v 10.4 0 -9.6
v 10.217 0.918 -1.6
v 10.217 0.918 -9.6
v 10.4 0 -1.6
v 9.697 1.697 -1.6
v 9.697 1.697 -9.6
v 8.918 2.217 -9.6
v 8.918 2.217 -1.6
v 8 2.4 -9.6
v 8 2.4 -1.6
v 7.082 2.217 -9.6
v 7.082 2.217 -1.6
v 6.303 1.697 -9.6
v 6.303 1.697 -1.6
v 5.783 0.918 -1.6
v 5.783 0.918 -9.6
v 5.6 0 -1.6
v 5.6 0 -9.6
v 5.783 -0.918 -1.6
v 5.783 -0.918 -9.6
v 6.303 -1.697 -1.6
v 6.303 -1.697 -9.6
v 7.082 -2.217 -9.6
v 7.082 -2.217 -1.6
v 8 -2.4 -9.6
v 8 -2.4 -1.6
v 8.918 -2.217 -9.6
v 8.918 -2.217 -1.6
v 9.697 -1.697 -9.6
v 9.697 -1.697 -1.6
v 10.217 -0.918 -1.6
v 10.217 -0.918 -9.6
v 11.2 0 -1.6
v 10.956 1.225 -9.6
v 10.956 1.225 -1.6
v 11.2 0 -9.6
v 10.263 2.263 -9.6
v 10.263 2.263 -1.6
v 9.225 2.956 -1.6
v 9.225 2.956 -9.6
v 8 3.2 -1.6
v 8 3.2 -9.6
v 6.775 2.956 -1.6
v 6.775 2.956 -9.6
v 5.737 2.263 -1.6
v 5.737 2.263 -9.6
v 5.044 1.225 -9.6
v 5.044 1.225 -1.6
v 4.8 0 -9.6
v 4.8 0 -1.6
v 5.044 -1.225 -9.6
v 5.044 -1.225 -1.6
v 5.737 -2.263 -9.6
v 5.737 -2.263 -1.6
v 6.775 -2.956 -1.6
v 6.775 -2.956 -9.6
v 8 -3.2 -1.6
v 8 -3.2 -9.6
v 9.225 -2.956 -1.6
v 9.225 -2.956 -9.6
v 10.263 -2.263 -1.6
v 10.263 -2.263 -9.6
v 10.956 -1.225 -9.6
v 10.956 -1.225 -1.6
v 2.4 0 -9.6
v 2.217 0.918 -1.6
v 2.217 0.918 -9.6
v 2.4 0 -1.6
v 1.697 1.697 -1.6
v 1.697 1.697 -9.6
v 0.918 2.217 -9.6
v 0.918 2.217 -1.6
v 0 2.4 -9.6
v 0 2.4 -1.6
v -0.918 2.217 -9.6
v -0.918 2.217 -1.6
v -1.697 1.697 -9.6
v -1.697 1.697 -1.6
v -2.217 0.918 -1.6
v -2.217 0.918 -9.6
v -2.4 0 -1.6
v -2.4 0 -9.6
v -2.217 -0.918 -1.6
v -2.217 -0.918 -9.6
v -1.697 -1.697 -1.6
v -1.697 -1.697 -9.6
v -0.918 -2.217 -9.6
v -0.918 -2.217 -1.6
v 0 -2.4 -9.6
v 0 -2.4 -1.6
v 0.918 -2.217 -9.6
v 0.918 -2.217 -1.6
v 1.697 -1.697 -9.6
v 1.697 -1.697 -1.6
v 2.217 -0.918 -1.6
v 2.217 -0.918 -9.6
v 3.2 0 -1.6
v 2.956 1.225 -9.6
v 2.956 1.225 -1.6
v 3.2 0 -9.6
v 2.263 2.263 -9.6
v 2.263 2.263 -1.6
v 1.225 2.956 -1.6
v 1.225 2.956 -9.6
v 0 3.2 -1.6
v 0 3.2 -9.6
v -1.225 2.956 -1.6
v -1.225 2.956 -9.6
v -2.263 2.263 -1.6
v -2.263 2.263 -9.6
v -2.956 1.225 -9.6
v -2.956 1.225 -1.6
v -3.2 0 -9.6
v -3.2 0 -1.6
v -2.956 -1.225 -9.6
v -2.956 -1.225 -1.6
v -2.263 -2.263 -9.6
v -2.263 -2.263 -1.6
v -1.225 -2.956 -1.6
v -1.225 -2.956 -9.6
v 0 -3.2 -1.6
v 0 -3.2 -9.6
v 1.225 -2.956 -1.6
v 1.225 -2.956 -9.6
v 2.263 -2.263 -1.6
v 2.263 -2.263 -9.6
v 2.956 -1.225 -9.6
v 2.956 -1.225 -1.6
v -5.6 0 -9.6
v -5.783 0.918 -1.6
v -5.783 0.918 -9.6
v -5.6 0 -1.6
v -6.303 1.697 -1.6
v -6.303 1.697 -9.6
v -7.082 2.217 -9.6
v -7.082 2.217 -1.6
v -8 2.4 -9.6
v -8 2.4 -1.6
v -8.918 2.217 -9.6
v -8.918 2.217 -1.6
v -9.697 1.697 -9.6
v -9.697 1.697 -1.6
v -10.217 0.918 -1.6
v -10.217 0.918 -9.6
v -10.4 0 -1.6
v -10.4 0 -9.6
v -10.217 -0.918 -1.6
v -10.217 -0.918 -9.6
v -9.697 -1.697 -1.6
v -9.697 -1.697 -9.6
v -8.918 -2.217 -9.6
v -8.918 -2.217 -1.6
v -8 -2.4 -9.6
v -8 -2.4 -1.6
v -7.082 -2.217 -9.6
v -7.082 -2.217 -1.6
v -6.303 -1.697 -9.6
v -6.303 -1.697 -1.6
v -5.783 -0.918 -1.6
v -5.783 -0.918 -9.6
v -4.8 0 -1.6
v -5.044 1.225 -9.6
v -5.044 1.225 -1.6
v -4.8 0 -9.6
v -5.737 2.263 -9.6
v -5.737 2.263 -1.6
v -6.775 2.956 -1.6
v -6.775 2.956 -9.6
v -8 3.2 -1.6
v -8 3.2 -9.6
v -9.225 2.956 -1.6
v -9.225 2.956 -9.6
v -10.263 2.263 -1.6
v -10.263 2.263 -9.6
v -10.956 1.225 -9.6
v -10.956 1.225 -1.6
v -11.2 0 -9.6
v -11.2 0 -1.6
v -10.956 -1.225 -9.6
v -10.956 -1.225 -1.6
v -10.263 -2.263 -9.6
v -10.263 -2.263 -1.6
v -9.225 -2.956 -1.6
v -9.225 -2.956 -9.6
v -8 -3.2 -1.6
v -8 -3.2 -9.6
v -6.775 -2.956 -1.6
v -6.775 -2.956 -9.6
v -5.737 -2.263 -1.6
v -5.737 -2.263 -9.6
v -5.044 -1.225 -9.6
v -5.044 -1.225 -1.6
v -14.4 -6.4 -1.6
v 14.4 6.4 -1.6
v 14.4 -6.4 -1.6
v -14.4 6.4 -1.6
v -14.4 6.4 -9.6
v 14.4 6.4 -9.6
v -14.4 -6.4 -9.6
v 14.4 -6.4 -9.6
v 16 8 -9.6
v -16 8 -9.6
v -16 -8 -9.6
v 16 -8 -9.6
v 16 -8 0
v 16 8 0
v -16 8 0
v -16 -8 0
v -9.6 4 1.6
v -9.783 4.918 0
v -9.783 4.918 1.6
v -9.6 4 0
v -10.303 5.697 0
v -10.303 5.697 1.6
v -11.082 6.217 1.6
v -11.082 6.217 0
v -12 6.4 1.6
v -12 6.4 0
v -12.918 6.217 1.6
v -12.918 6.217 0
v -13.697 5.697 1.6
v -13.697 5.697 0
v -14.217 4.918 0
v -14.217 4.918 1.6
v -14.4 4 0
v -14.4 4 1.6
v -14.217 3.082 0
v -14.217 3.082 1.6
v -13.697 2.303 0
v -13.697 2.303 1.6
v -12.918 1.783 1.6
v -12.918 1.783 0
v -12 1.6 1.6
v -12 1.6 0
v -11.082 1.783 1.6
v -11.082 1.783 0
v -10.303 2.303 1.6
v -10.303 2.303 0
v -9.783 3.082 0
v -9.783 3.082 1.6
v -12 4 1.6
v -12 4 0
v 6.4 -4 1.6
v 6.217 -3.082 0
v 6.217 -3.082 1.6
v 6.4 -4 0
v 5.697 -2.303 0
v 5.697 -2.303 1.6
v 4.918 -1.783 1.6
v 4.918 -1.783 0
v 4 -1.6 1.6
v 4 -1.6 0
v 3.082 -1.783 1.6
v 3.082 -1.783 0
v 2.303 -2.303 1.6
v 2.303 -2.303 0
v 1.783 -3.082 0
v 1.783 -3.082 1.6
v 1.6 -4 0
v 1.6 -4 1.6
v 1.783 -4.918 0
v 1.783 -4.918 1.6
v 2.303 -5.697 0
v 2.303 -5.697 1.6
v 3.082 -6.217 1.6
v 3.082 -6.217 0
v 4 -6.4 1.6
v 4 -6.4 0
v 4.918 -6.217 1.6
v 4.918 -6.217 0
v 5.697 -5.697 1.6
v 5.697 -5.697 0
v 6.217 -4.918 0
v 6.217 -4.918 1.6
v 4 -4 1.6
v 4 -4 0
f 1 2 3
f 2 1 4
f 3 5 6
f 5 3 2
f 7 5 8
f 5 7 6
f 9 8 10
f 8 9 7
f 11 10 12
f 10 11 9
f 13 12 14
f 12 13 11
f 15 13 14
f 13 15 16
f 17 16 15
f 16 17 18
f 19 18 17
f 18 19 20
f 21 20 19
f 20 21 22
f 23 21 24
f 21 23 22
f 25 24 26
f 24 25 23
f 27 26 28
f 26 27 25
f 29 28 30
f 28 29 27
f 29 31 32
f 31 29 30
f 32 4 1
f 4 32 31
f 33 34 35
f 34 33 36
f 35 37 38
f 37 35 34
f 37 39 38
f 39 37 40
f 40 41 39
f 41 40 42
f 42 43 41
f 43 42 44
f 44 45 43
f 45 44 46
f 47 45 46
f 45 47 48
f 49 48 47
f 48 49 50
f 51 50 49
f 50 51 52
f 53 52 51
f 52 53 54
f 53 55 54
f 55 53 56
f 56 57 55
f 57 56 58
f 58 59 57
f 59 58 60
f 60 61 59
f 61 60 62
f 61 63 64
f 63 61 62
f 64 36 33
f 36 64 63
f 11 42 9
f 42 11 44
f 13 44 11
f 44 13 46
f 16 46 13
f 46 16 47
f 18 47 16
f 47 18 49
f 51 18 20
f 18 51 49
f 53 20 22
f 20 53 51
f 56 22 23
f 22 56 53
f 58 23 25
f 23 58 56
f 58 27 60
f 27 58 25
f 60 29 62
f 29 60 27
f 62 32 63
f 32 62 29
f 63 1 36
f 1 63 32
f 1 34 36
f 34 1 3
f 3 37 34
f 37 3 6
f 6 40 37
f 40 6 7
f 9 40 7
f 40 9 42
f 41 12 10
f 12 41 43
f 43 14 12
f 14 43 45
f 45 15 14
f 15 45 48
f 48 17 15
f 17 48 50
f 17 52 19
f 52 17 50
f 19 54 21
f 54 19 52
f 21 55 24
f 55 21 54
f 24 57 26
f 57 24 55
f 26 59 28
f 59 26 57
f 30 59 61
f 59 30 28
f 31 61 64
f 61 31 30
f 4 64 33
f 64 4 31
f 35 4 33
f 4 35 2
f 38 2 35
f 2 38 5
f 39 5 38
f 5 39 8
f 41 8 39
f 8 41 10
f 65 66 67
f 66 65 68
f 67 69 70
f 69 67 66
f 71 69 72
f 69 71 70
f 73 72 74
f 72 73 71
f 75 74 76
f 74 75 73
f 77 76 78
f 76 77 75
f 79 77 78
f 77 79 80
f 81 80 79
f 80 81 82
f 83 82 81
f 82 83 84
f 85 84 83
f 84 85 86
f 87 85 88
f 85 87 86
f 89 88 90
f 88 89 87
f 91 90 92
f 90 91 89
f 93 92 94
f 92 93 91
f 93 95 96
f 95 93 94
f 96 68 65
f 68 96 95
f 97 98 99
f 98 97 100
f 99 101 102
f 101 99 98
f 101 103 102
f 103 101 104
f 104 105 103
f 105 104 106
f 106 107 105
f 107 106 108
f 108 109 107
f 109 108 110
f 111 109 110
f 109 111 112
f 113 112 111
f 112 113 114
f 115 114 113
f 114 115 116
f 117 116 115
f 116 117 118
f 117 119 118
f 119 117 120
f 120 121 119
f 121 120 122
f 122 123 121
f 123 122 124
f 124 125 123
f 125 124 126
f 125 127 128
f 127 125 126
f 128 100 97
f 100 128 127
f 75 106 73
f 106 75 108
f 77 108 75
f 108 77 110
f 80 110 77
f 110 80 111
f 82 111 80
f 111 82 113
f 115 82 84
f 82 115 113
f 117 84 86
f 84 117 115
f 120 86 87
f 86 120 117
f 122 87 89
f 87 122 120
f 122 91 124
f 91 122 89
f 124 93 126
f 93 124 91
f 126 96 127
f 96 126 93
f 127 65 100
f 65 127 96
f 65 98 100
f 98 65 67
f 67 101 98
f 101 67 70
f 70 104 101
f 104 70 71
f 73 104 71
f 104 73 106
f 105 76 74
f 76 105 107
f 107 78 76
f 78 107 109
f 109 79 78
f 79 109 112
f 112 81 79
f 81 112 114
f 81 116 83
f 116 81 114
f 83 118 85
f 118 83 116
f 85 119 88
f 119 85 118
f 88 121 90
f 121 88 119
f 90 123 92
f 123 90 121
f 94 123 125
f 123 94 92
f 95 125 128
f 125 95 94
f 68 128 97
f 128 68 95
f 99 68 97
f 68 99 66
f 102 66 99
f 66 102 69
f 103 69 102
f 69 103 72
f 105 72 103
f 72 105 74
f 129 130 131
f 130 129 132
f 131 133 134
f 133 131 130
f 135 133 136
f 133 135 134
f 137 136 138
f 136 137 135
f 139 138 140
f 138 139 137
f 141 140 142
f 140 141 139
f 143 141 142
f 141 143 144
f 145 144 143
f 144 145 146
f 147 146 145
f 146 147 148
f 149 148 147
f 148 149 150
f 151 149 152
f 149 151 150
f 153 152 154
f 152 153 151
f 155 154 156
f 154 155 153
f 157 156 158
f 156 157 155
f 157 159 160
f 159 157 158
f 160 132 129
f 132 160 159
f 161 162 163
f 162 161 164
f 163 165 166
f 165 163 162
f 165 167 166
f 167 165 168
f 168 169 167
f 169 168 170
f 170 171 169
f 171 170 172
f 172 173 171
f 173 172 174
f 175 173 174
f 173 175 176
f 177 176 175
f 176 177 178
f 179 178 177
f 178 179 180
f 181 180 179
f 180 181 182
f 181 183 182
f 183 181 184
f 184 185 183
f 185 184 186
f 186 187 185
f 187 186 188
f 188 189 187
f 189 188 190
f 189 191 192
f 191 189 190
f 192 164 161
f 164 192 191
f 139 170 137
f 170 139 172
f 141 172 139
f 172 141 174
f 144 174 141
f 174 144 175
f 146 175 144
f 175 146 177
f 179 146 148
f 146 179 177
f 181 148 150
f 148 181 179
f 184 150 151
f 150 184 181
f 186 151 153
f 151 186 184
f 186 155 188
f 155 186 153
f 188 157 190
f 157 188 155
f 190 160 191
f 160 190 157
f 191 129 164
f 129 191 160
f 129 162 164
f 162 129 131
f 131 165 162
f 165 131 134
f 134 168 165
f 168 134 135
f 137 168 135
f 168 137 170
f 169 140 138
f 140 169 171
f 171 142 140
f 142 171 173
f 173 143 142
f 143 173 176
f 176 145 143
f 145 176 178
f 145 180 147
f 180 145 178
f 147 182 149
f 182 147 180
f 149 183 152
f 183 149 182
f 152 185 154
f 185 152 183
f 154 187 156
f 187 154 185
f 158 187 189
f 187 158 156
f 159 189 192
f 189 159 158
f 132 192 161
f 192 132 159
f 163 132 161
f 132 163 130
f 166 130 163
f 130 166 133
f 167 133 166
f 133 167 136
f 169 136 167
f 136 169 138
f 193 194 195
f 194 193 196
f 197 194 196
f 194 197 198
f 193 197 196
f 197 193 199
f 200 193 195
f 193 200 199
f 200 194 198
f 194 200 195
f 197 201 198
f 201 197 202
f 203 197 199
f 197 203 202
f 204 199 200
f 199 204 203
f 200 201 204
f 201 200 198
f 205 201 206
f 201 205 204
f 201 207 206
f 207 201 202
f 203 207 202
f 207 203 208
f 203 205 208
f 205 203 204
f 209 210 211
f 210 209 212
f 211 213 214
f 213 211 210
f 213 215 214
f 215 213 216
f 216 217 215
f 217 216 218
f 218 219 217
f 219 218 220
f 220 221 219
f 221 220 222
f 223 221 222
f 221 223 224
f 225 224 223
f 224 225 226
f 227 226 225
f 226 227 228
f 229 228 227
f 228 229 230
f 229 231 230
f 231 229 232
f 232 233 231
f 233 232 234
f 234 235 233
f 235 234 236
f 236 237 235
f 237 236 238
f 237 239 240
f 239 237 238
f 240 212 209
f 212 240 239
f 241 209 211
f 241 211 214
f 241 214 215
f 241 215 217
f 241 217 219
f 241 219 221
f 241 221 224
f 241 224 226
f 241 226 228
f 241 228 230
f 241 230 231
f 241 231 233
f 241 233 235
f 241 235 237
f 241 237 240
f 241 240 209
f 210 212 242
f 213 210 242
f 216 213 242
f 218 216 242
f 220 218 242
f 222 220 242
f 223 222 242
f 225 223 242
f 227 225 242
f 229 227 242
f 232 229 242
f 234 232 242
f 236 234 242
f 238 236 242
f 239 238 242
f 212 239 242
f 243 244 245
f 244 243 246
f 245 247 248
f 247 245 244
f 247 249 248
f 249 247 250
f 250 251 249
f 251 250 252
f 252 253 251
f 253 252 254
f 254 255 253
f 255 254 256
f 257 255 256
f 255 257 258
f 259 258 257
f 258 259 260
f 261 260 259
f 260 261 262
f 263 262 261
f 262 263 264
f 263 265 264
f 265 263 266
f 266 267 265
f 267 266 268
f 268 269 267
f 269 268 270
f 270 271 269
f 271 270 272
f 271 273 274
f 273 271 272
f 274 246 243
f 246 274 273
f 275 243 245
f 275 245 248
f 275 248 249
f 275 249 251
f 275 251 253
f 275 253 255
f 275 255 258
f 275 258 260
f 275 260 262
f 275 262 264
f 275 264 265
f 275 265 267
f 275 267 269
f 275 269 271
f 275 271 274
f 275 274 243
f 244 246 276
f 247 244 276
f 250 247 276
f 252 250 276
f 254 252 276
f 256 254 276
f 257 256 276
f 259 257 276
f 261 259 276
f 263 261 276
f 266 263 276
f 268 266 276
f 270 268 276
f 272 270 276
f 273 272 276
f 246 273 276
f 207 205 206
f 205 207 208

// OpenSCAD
// file: ../p/4-4ring3.scad
use <../lib.scad>
$fa=1; $fs=0.2;
function ldraw_lib__4_4ring3(realsolid=false) = [
// 0 Ring  3 x 1.0
// 0 Name: 4-4ring3.dat
// 0 Author: James Jessiman
// 0 !LDRAW_ORG Primitive UPDATE 2009-01
// 0 !LICENSE Licensed under CC BY 2.0 and CC BY 4.0 : see CAreadme.txt
// 
// 0 BFC CERTIFY CCW
  [0,"BFC","CERTIFY"],
  [0,"BFC","CCW"],
// 
// 0 !HISTORY 1998-12-15 [PTadmin] Official Update 1998-10
// 0 !HISTORY 2002-04-05 [hafhead] Added BFC statement
// 0 !HISTORY 2002-04-25 [PTadmin] Official Update 2002-02
// 0 !HISTORY 2007-06-24 [PTadmin] Header formatted for Contributor Agreement
// 0 !HISTORY 2008-07-01 [PTadmin] Official Update 2008-01
// 0 !HISTORY 2008-08-26 [cwdee] Switch polygon winding and rename
// 0 !HISTORY 2009-05-02 [PTadmin] Official Update 2009-01
// 
// 
// 4 16 -1.5308 0 3.6956 -1.1481 0 2.7717 0 0 3 0 0 4
  [4,16,-1.5308,0,3.6956,-1.1481,0,2.7717,0,0,3,0,0,4],
// 4 16 -2.8284 0 2.8284 -2.1213 0 2.1213 -1.1481 0 2.7717 -1.5308 0 3.6956
  [4,16,-2.8284,0,2.8284,-2.1213,0,2.1213,-1.1481,0,2.7717,-1.5308,0,3.6956],
// 4 16 -3.6956 0 1.5308 -2.7717 0 1.1481 -2.1213 0 2.1213 -2.8284 0 2.8284
  [4,16,-3.6956,0,1.5308,-2.7717,0,1.1481,-2.1213,0,2.1213,-2.8284,0,2.8284],
// 4 16 -4 0 0 -3 0 0 -2.7717 0 1.1481 -3.6956 0 1.5308
  [4,16,-4,0,0,-3,0,0,-2.7717,0,1.1481,-3.6956,0,1.5308],
// 4 16 -3.6956 0 -1.5308 -2.7717 0 -1.1481 -3 0 0 -4 0 0
  [4,16,-3.6956,0,-1.5308,-2.7717,0,-1.1481,-3,0,0,-4,0,0],
// 4 16 -2.8284 0 -2.8284 -2.1213 0 -2.1213 -2.7717 0 -1.1481 -3.6956 0 -1.5308
  [4,16,-2.8284,0,-2.8284,-2.1213,0,-2.1213,-2.7717,0,-1.1481,-3.6956,0,-1.5308],
// 4 16 -1.5308 0 -3.6956 -1.1481 0 -2.7717 -2.1213 0 -2.1213 -2.8284 0 -2.8284
  [4,16,-1.5308,0,-3.6956,-1.1481,0,-2.7717,-2.1213,0,-2.1213,-2.8284,0,-2.8284],
// 4 16 0 0 -4 0 0 -3 -1.1481 0 -2.7717 -1.5308 0 -3.6956
  [4,16,0,0,-4,0,0,-3,-1.1481,0,-2.7717,-1.5308,0,-3.6956],
// 4 16 1.5308 0 -3.6956 1.1481 0 -2.7717 0 0 -3 0 0 -4
  [4,16,1.5308,0,-3.6956,1.1481,0,-2.7717,0,0,-3,0,0,-4],
// 4 16 2.8284 0 -2.8284 2.1213 0 -2.1213 1.1481 0 -2.7717 1.5308 0 -3.6956
  [4,16,2.8284,0,-2.8284,2.1213,0,-2.1213,1.1481,0,-2.7717,1.5308,0,-3.6956],
// 4 16 3.6956 0 -1.5308 2.7717 0 -1.1481 2.1213 0 -2.1213 2.8284 0 -2.8284
  [4,16,3.6956,0,-1.5308,2.7717,0,-1.1481,2.1213,0,-2.1213,2.8284,0,-2.8284],
// 4 16 4 0 0 3 0 0 2.7717 0 -1.1481 3.6956 0 -1.5308
  [4,16,4,0,0,3,0,0,2.7717,0,-1.1481,3.6956,0,-1.5308],
// 4 16 3.6956 0 1.5308 2.7717 0 1.1481 3 0 0 4 0 0
  [4,16,3.6956,0,1.5308,2.7717,0,1.1481,3,0,0,4,0,0],
// 4 16 2.8284 0 2.8284 2.1213 0 2.1213 2.7717 0 1.1481 3.6956 0 1.5308
  [4,16,2.8284,0,2.8284,2.1213,0,2.1213,2.7717,0,1.1481,3.6956,0,1.5308],
// 4 16 1.5308 0 3.6956 1.1481 0 2.7717 2.1213 0 2.1213 2.8284 0 2.8284
  [4,16,1.5308,0,3.6956,1.1481,0,2.7717,2.1213,0,2.1213,2.8284,0,2.8284],
// 4 16 0 0 4 0 0 3 1.1481 0 2.7717 1.5308 0 3.6956
  [4,16,0,0,4,0,0,3,1.1481,0,2.7717,1.5308,0,3.6956],
// 0
];
module ldraw_lib__4_4ring3(step=0, col=false, unit=2/5, alt=false, line=0.2, solid=!$preview)
    makepoly(ldraw_lib__4_4ring3(solid), step=step, col=col, unit=unit, alt=alt, line=line, solid=solid);
ldraw_lib__4_4ring3(line=0.2);
// file: ../p/4-4edge.scad
use <../lib.scad>
function ldraw_lib__4_4edge() = [
// 0 Circle 1.0
// 0 Name: 4-4edge.dat
// 0 Author: James Jessiman
// 0 !LDRAW_ORG Primitive UPDATE 2017-01
// 0 !LICENSE Licensed under CC BY 2.0 and CC BY 4.0 : see CAreadme.txt
// 
// 0 BFC CERTIFY CCW
  [0,"BFC","CERTIFY"],
  [0,"BFC","CCW"],
// 
// 0 !HISTORY 1998-12-15 [PTadmin] Official Update 1998-10
// 0 !HISTORY 2005-12-28 [PTadmin] Official Update 2005-01
// 0 !HISTORY 2007-06-24 [PTadmin] Header formatted for Contributor Agreement
// 0 !HISTORY 2008-07-01 [PTadmin] Official Update 2008-01
// 0 !HISTORY 2017-01-15 [Steffen] BFCed
// 0 !HISTORY 2017-12-30 [PTadmin] Official Update 2017-01
// 
// 
// 2 24 1 0 0 0.9239 0 0.3827
  [2,24,1,0,0,0.9239,0,0.3827],
// 2 24 0.9239 0 0.3827 0.7071 0 0.7071
  [2,24,0.9239,0,0.3827,0.7071,0,0.7071],
// 2 24 0.7071 0 0.7071 0.3827 0 0.9239
  [2,24,0.7071,0,0.7071,0.3827,0,0.9239],
// 2 24 0.3827 0 0.9239 0 0 1
  [2,24,0.3827,0,0.9239,0,0,1],
// 2 24 0 0 1 -0.3827 0 0.9239
  [2,24,0,0,1,-0.3827,0,0.9239],
// 2 24 -0.3827 0 0.9239 -0.7071 0 0.7071
  [2,24,-0.3827,0,0.9239,-0.7071,0,0.7071],
// 2 24 -0.7071 0 0.7071 -0.9239 0 0.3827
  [2,24,-0.7071,0,0.7071,-0.9239,0,0.3827],
// 2 24 -0.9239 0 0.3827 -1 0 -0
  [2,24,-0.9239,0,0.3827,-1,0,-0],
// 2 24 -1 0 -0 -0.9239 0 -0.3827
  [2,24,-1,0,-0,-0.9239,0,-0.3827],
// 2 24 -0.9239 0 -0.3827 -0.7071 0 -0.7071
  [2,24,-0.9239,0,-0.3827,-0.7071,0,-0.7071],
// 2 24 -0.7071 0 -0.7071 -0.3827 0 -0.9239
  [2,24,-0.7071,0,-0.7071,-0.3827,0,-0.9239],
// 2 24 -0.3827 0 -0.9239 0 0 -1
  [2,24,-0.3827,0,-0.9239,0,0,-1],
// 2 24 0 0 -1 0.3827 0 -0.9239
  [2,24,0,0,-1,0.3827,0,-0.9239],
// 2 24 0.3827 0 -0.9239 0.7071 0 -0.7071
  [2,24,0.3827,0,-0.9239,0.7071,0,-0.7071],
// 2 24 0.7071 0 -0.7071 0.9239 0 -0.3827
  [2,24,0.7071,0,-0.7071,0.9239,0,-0.3827],
// 2 24 0.9239 0 -0.3827 1 0 0
  [2,24,0.9239,0,-0.3827,1,0,0],
];
module ldraw_lib__4_4edge(step=0, col=false, unit=2/5, alt=false, line=0.2, solid=!$preview)
    makepoly(ldraw_lib__4_4edge(), step=step, col=col, unit=unit, alt=alt, line=line, solid=solid);
ldraw_lib__4_4edge(line=0.2);
// file: ../p/4-4disc.scad
use <../lib.scad>
function ldraw_lib__4_4disc() = [
// 0 Disc 1.0
// 0 Name: 4-4disc.dat
// 0 Author: James Jessiman
// 0 !LDRAW_ORG Primitive UPDATE 2002-02
// 0 !LICENSE Licensed under CC BY 2.0 and CC BY 4.0 : see CAreadme.txt
// 
// 0 BFC CERTIFY CCW
  [0,"BFC","CERTIFY"],
  [0,"BFC","CCW"],
// 
// 0 !HISTORY 1998-12-15 [PTadmin] Official Update 1998-10
// 0 !HISTORY 2002-03-23 [sbliss] Added BFC statement
// 0 !HISTORY 2002-04-25 [PTadmin] Official Update 2002-02
// 0 !HISTORY 2007-06-24 [PTadmin] Header formatted for Contributor Agreement
// 0 !HISTORY 2008-07-01 [PTadmin] Official Update 2008-01
// 
// 
// 3 16 0 0 0 1 0 0 0.9239 0 0.3827
  [3,16,0,0,0,1,0,0,0.9239,0,0.3827],
// 3 16 0 0 0 0.9239 0 0.3827 0.7071 0 0.7071
  [3,16,0,0,0,0.9239,0,0.3827,0.7071,0,0.7071],
// 3 16 0 0 0 0.7071 0 0.7071 0.3827 0 0.9239
  [3,16,0,0,0,0.7071,0,0.7071,0.3827,0,0.9239],
// 3 16 0 0 0 0.3827 0 0.9239 0 0 1
  [3,16,0,0,0,0.3827,0,0.9239,0,0,1],
// 3 16 0 0 0 0 0 1 -0.3827 0 0.9239
  [3,16,0,0,0,0,0,1,-0.3827,0,0.9239],
// 3 16 0 0 0 -0.3827 0 0.9239 -0.7071 0 0.7071
  [3,16,0,0,0,-0.3827,0,0.9239,-0.7071,0,0.7071],
// 3 16 0 0 0 -0.7071 0 0.7071 -0.9239 0 0.3827
  [3,16,0,0,0,-0.7071,0,0.7071,-0.9239,0,0.3827],
// 3 16 0 0 0 -0.9239 0 0.3827 -1 0 -0
  [3,16,0,0,0,-0.9239,0,0.3827,-1,0,-0],
// 3 16 0 0 0 -1 0 -0 -0.9239 0 -0.3827
  [3,16,0,0,0,-1,0,-0,-0.9239,0,-0.3827],
// 3 16 0 0 0 -0.9239 0 -0.3827 -0.7071 0 -0.7071
  [3,16,0,0,0,-0.9239,0,-0.3827,-0.7071,0,-0.7071],
// 3 16 0 0 0 -0.7071 0 -0.7071 -0.3827 0 -0.9239
  [3,16,0,0,0,-0.7071,0,-0.7071,-0.3827,0,-0.9239],
// 3 16 0 0 0 -0.3827 0 -0.9239 0 0 -1
  [3,16,0,0,0,-0.3827,0,-0.9239,0,0,-1],
// 3 16 0 0 0 0 0 -1 0.3827 0 -0.9239
  [3,16,0,0,0,0,0,-1,0.3827,0,-0.9239],
// 3 16 0 0 0 0.3827 0 -0.9239 0.7071 0 -0.7071
  [3,16,0,0,0,0.3827,0,-0.9239,0.7071,0,-0.7071],
// 3 16 0 0 0 0.7071 0 -0.7071 0.9239 0 -0.3827
  [3,16,0,0,0,0.7071,0,-0.7071,0.9239,0,-0.3827],
// 3 16 0 0 0 0.9239 0 -0.3827 1 0 0
  [3,16,0,0,0,0.9239,0,-0.3827,1,0,0],
// 0
];
module ldraw_lib__4_4disc(step=0, col=false, unit=2/5, alt=false, line=0.2, solid=!$preview)
    makepoly(ldraw_lib__4_4disc(), step=step, col=col, unit=unit, alt=alt, line=line, solid=solid);
ldraw_lib__4_4disc(line=0.2);
// file: ../p/4-4cyli.scad
use <../lib.scad>
$fa=1; $fs=0.2;
function ldraw_lib__4_4cyli(realsolid=false) = [
// 0 Cylinder 1.0
// 0 Name: 4-4cyli.dat
// 0 Author: James Jessiman
// 0 !LDRAW_ORG Primitive UPDATE 2005-01
// 0 !LICENSE Licensed under CC BY 2.0 and CC BY 4.0 : see CAreadme.txt
// 
// 0 BFC CERTIFY CCW
  [0,"BFC","CERTIFY"],
  [0,"BFC","CCW"],
// 
// 0 !HISTORY 1998-12-15 [PTadmin] Official Update 1998-10
// 0 !HISTORY 2002-03-23 [sbliss] Added BFC statement; merged headers from files in distributions LDraw 0.27 and Complete.
// 0 !HISTORY 2002-04-25 [PTadmin] Official Update 2002-02
// 0 !HISTORY 2004-12-14 [guyvivan] BFC CCW
// 0 !HISTORY 2005-12-28 [PTadmin] Official Update 2005-01
// 0 !HISTORY 2007-06-24 [PTadmin] Header formatted for Contributor Agreement
// 0 !HISTORY 2008-07-01 [PTadmin] Official Update 2008-01
// 
// 
// 4 16 1 1 0 0.9239 1 0.3827 0.9239 0 0.3827 1 0 0
  [4,16,1,1,0,0.9239,1,0.3827,0.9239,0,0.3827,1,0,0],
// 5 24 1 0 0 1 1 0 0.9239 0 0.3827 0.9239 0 -0.3827
  [5,24,1,0,0,1,1,0,0.9239,0,0.3827,0.9239,0,-0.3827],
// 4 16 0.9239 1 0.3827 0.7071 1 0.7071 0.7071 0 0.7071 0.9239 0 0.3827
  [4,16,0.9239,1,0.3827,0.7071,1,0.7071,0.7071,0,0.7071,0.9239,0,0.3827],
// 5 24 0.9239 0 0.3827 0.9239 1 0.3827 0.7071 0 0.7071 1 0 0
  [5,24,0.9239,0,0.3827,0.9239,1,0.3827,0.7071,0,0.7071,1,0,0],
// 4 16 0.7071 1 0.7071 0.3827 1 0.9239 0.3827 0 0.9239 0.7071 0 0.7071
  [4,16,0.7071,1,0.7071,0.3827,1,0.9239,0.3827,0,0.9239,0.7071,0,0.7071],
// 5 24 0.7071 0 0.7071 0.7071 1 0.7071 0.3827 0 0.9239 0.9239 0 0.3827
  [5,24,0.7071,0,0.7071,0.7071,1,0.7071,0.3827,0,0.9239,0.9239,0,0.3827],
// 4 16 0.3827 1 0.9239 0 1 1 0 0 1 0.3827 0 0.9239
  [4,16,0.3827,1,0.9239,0,1,1,0,0,1,0.3827,0,0.9239],
// 5 24 0.3827 0 0.9239 0.3827 1 0.9239 0 0 1 0.7071 0 0.7071
  [5,24,0.3827,0,0.9239,0.3827,1,0.9239,0,0,1,0.7071,0,0.7071],
// 4 16 0 1 1 -0.3827 1 0.9239 -0.3827 0 0.9239 0 0 1
  [4,16,0,1,1,-0.3827,1,0.9239,-0.3827,0,0.9239,0,0,1],
// 5 24 0 0 1 0 1 1 -0.3827 0 0.9239 0.3827 0 0.9239
  [5,24,0,0,1,0,1,1,-0.3827,0,0.9239,0.3827,0,0.9239],
// 4 16 -0.3827 1 0.9239 -0.7071 1 0.7071 -0.7071 0 0.7071 -0.3827 0 0.9239
  [4,16,-0.3827,1,0.9239,-0.7071,1,0.7071,-0.7071,0,0.7071,-0.3827,0,0.9239],
// 5 24 -0.3827 0 0.9239 -0.3827 1 0.9239 -0.7071 0 0.7071 0 0 1
  [5,24,-0.3827,0,0.9239,-0.3827,1,0.9239,-0.7071,0,0.7071,0,0,1],
// 4 16 -0.7071 1 0.7071 -0.9239 1 0.3827 -0.9239 0 0.3827 -0.7071 0 0.7071
  [4,16,-0.7071,1,0.7071,-0.9239,1,0.3827,-0.9239,0,0.3827,-0.7071,0,0.7071],
// 5 24 -0.7071 0 0.7071 -0.7071 1 0.7071 -0.9239 0 0.3827 -0.3827 0 0.9239
  [5,24,-0.7071,0,0.7071,-0.7071,1,0.7071,-0.9239,0,0.3827,-0.3827,0,0.9239],
// 4 16 -0.9239 1 0.3827 -1 1 0 -1 0 0 -0.9239 0 0.3827
  [4,16,-0.9239,1,0.3827,-1,1,0,-1,0,0,-0.9239,0,0.3827],
// 5 24 -0.9239 0 0.3827 -0.9239 1 0.3827 -1 0 0 -0.7071 0 0.7071
  [5,24,-0.9239,0,0.3827,-0.9239,1,0.3827,-1,0,0,-0.7071,0,0.7071],
// 4 16 -1 1 0 -0.9239 1 -0.3827 -0.9239 0 -0.3827 -1 0 0
  [4,16,-1,1,0,-0.9239,1,-0.3827,-0.9239,0,-0.3827,-1,0,0],
// 5 24 -1 0 0 -1 1 0 -0.9239 0 -0.3827 -0.9239 0 0.3827
  [5,24,-1,0,0,-1,1,0,-0.9239,0,-0.3827,-0.9239,0,0.3827],
// 4 16 -0.9239 1 -0.3827 -0.7071 1 -0.7071 -0.7071 0 -0.7071 -0.9239 0 -0.3827
  [4,16,-0.9239,1,-0.3827,-0.7071,1,-0.7071,-0.7071,0,-0.7071,-0.9239,0,-0.3827],
// 5 24 -0.9239 0 -0.3827 -0.9239 1 -0.3827 -0.7071 0 -0.7071 -1 0 0
  [5,24,-0.9239,0,-0.3827,-0.9239,1,-0.3827,-0.7071,0,-0.7071,-1,0,0],
// 4 16 -0.7071 1 -0.7071 -0.3827 1 -0.9239 -0.3827 0 -0.9239 -0.7071 0 -0.7071
  [4,16,-0.7071,1,-0.7071,-0.3827,1,-0.9239,-0.3827,0,-0.9239,-0.7071,0,-0.7071],
// 5 24 -0.7071 0 -0.7071 -0.7071 1 -0.7071 -0.3827 0 -0.9239 -0.9239 0 -0.3827
  [5,24,-0.7071,0,-0.7071,-0.7071,1,-0.7071,-0.3827,0,-0.9239,-0.9239,0,-0.3827],
// 4 16 -0.3827 1 -0.9239 0 1 -1 0 0 -1 -0.3827 0 -0.9239
  [4,16,-0.3827,1,-0.9239,0,1,-1,0,0,-1,-0.3827,0,-0.9239],
// 5 24 -0.3827 0 -0.9239 -0.3827 1 -0.9239 0 0 -1 -0.7071 0 -0.7071
  [5,24,-0.3827,0,-0.9239,-0.3827,1,-0.9239,0,0,-1,-0.7071,0,-0.7071],
// 4 16 0 1 -1 0.3827 1 -0.9239 0.3827 0 -0.9239 0 0 -1
  [4,16,0,1,-1,0.3827,1,-0.9239,0.3827,0,-0.9239,0,0,-1],
// 5 24 0 0 -1 0 1 -1 0.3827 0 -0.9239 -0.3827 0 -0.9239
  [5,24,0,0,-1,0,1,-1,0.3827,0,-0.9239,-0.3827,0,-0.9239],
// 4 16 0.3827 1 -0.9239 0.7071 1 -0.7071 0.7071 0 -0.7071 0.3827 0 -0.9239
  [4,16,0.3827,1,-0.9239,0.7071,1,-0.7071,0.7071,0,-0.7071,0.3827,0,-0.9239],
// 5 24 0.3827 0 -0.9239 0.3827 1 -0.9239 0.7071 0 -0.7071 0 0 -1
  [5,24,0.3827,0,-0.9239,0.3827,1,-0.9239,0.7071,0,-0.7071,0,0,-1],
// 4 16 0.7071 1 -0.7071 0.9239 1 -0.3827 0.9239 0 -0.3827 0.7071 0 -0.7071
  [4,16,0.7071,1,-0.7071,0.9239,1,-0.3827,0.9239,0,-0.3827,0.7071,0,-0.7071],
// 5 24 0.7071 0 -0.7071 0.7071 1 -0.7071 0.9239 0 -0.3827 0.3827 0 -0.9239
  [5,24,0.7071,0,-0.7071,0.7071,1,-0.7071,0.9239,0,-0.3827,0.3827,0,-0.9239],
// 4 16 0.9239 1 -0.3827 1 1 0 1 0 0 0.9239 0 -0.3827
  [4,16,0.9239,1,-0.3827,1,1,0,1,0,0,0.9239,0,-0.3827],
// 5 24 0.9239 0 -0.3827 0.9239 1 -0.3827 1 0 0 0.7071 0 -0.7071
  [5,24,0.9239,0,-0.3827,0.9239,1,-0.3827,1,0,0,0.7071,0,-0.7071],
// 0
];
module ldraw_lib__4_4cyli(step=0, col=false, unit=2/5, alt=false, line=0.2, solid=!$preview)
    makepoly(ldraw_lib__4_4cyli(solid), step=step, col=col, unit=unit, alt=alt, line=line, solid=solid);
ldraw_lib__4_4cyli(line=0.2);
// file: ../p/stud4.scad
use <../lib.scad>
use <4-4cyli.scad>
use <4-4edge.scad>
use <4-4ring3.scad>
function ldraw_lib__stud4() = [
// 0 Stud Tube Open
// 0 Name: stud4.dat
// 0 Author: James Jessiman
// 0 !LDRAW_ORG Primitive UPDATE 2009-02
// 0 !LICENSE Licensed under CC BY 4.0 : see CAreadme.txt
// 
// 0 BFC CERTIFY CCW
  [0,"BFC","CERTIFY"],
  [0,"BFC","CCW"],
// 
// 0 !HISTORY 1999-07-05 [PTadmin] Official Update 1999-05
// 0 !HISTORY 2002-04-04 [sbliss] Modified for BFC compliance
// 0 !HISTORY 2002-04-25 [PTadmin] Official Update 2002-02
// 0 !HISTORY 2007-06-24 [PTadmin] Header formatted for Contributor Agreement
// 0 !HISTORY 2008-07-01 [PTadmin] Official Update 2008-01
// 0 !HISTORY 2009-06-21 [cwdee] Update ring references to 4-4ring
// 0 !HISTORY 2009-09-03 [PTadmin] Official Update 2009-02
// 
// 
// 1 16 0 -4 0 6 0 0 0 1 0 0 0 6 4-4edge.dat
  [1,16,0,-4,0,6,0,0,0,1,0,0,0,6, ldraw_lib__4_4edge()],
// 1 16 0 -4 0 8 0 0 0 1 0 0 0 8 4-4edge.dat
  [1,16,0,-4,0,8,0,0,0,1,0,0,0,8, ldraw_lib__4_4edge()],
// 1 16 0 0 0 6 0 0 0 1 0 0 0 6 4-4edge.dat
  [1,16,0,0,0,6,0,0,0,1,0,0,0,6, ldraw_lib__4_4edge()],
// 1 16 0 0 0 8 0 0 0 1 0 0 0 8 4-4edge.dat
  [1,16,0,0,0,8,0,0,0,1,0,0,0,8, ldraw_lib__4_4edge()],
// 0 BFC INVERTNEXT
  [0,"BFC","INVERTNEXT"],
// 1 16 0 -4 0 6 0 0 0 4 0 0 0 6 4-4cyli.dat
  [1,16,0,-4,0,6,0,0,0,4,0,0,0,6, ldraw_lib__4_4cyli()],
// 1 16 0 -4 0 8 0 0 0 4 0 0 0 8 4-4cyli.dat
  [1,16,0,-4,0,8,0,0,0,4,0,0,0,8, ldraw_lib__4_4cyli()],
// 1 16 0 -4 0 2 0 0 0 1 0 0 0 2 4-4ring3.dat
  [1,16,0,-4,0,2,0,0,0,1,0,0,0,2, ldraw_lib__4_4ring3()],
  [-1,16,0,0,0,2,0,0,0,-1,0,0,0,2, ldraw_lib__4_4ring3()],
// 0
];
module ldraw_lib__stud4(step=0, col=false, unit=2/5, alt=false, line=0.2, solid=!$preview)
    makepoly(ldraw_lib__stud4(), step=step, col=col, unit=unit, alt=alt, line=line, solid=solid);
ldraw_lib__stud4(line=0.2);
// file: ../p/box5.scad
use <../lib.scad>
function ldraw_lib__box5() = [
// 0 Box with 5 Faces and All Edges
// 0 Name: box5.dat
// 0 Author: James Jessiman
// 0 !LDRAW_ORG Primitive UPDATE 2012-01
// 0 !LICENSE Licensed under CC BY 2.0 and CC BY 4.0 : see CAreadme.txt
// 
// 0 BFC CERTIFY CCW
  [0,"BFC","CERTIFY"],
  [0,"BFC","CCW"],
// 
// 0 !HISTORY 2002-04-03 [sbliss] Modified for BFC compliance
// 0 !HISTORY 2002-04-25 [PTadmin] Official Update 2002-02
// 0 !HISTORY 2007-06-24 [PTadmin] Header formatted for Contributor Agreement
// 0 !HISTORY 2008-07-01 [PTadmin] Official Update 2008-01
// 0 !HISTORY 2012-02-16 [Philo] Changed to CCW
// 0 !HISTORY 2012-03-30 [PTadmin] Official Update 2012-01
// 
// 
// 2 24 1 1 1 -1 1 1
  [2,24,1,1,1,-1,1,1],
// 2 24 -1 1 1 -1 1 -1
  [2,24,-1,1,1,-1,1,-1],
// 2 24 -1 1 -1 1 1 -1
  [2,24,-1,1,-1,1,1,-1],
// 2 24 1 1 -1 1 1 1
  [2,24,1,1,-1,1,1,1],
// 2 24 1 0 1 -1 0 1
  [2,24,1,0,1,-1,0,1],
// 2 24 -1 0 1 -1 0 -1
  [2,24,-1,0,1,-1,0,-1],
// 2 24 -1 0 -1 1 0 -1
  [2,24,-1,0,-1,1,0,-1],
// 2 24 1 0 -1 1 0 1
  [2,24,1,0,-1,1,0,1],
// 2 24 1 0 1 1 1 1
  [2,24,1,0,1,1,1,1],
// 2 24 -1 0 1 -1 1 1
  [2,24,-1,0,1,-1,1,1],
// 2 24 1 0 -1 1 1 -1
  [2,24,1,0,-1,1,1,-1],
// 2 24 -1 0 -1 -1 1 -1
  [2,24,-1,0,-1,-1,1,-1],
// 4 16 -1 1 1 1 1 1 1 1 -1 -1 1 -1
  [4,16,-1,1,1,1,1,1,1,1,-1,-1,1,-1],
// 4 16 -1 1 1 -1 0 1 1 0 1 1 1 1
  [4,16,-1,1,1,-1,0,1,1,0,1,1,1,1],
// 4 16 -1 1 -1 -1 0 -1 -1 0 1 -1 1 1
  [4,16,-1,1,-1,-1,0,-1,-1,0,1,-1,1,1],
// 4 16 1 1 -1 1 0 -1 -1 0 -1 -1 1 -1
  [4,16,1,1,-1,1,0,-1,-1,0,-1,-1,1,-1],
// 4 16 1 1 1 1 0 1 1 0 -1 1 1 -1
  [4,16,1,1,1,1,0,1,1,0,-1,1,1,-1],
];
makepoly(ldraw_lib__box5(), line=0.2);
// file: ../p/box4.scad
use <../lib.scad>
function ldraw_lib__box4() = [
// 0 Box with 4 Faces (2 Parallel Pairs) and All Edges
// 0 Name: box4.dat
// 0 Author: James Jessiman
// 0 !LDRAW_ORG Primitive UPDATE 2012-01
// 0 !LICENSE Licensed under CC BY 4.0 : see CAreadme.txt
// 
// 0 BFC CERTIFY CCW
  [0,"BFC","CERTIFY"],
  [0,"BFC","CCW"],
// 
// 0 !HISTORY 2002-04-03 [sbliss] Modified for BFC compliance
// 0 !HISTORY 2002-04-25 [PTadmin] Official Update 2002-02
// 0 !HISTORY 2007-06-24 [PTadmin] Header formatted for Contributor Agreement
// 0 !HISTORY 2008-07-01 [PTadmin] Official Update 2008-01
// 0 !HISTORY 2012-02-16 [Philo] Changed to CCW
// 0 !HISTORY 2012-03-30 [PTadmin] Official Update 2012-01
// 
// 
// 2 24 1 1 1 -1 1 1
  [2,24,1,1,1,-1,1,1],
// 2 24 -1 1 1 -1 1 -1
  [2,24,-1,1,1,-1,1,-1],
// 2 24 -1 1 -1 1 1 -1
  [2,24,-1,1,-1,1,1,-1],
// 2 24 1 1 -1 1 1 1
  [2,24,1,1,-1,1,1,1],
// 2 24 1 0 1 -1 0 1
  [2,24,1,0,1,-1,0,1],
// 2 24 -1 0 1 -1 0 -1
  [2,24,-1,0,1,-1,0,-1],
// 2 24 -1 0 -1 1 0 -1
  [2,24,-1,0,-1,1,0,-1],
// 2 24 1 0 -1 1 0 1
  [2,24,1,0,-1,1,0,1],
// 2 24 1 0 1 1 1 1
  [2,24,1,0,1,1,1,1],
// 2 24 -1 0 1 -1 1 1
  [2,24,-1,0,1,-1,1,1],
// 2 24 1 0 -1 1 1 -1
  [2,24,1,0,-1,1,1,-1],
// 2 24 -1 0 -1 -1 1 -1
  [2,24,-1,0,-1,-1,1,-1],
// 4 16 -1 1 1 -1 0 1 1 0 1 1 1 1
  [4,16,-1,1,1,-1,0,1,1,0,1,1,1,1],
// 4 16 -1 1 -1 -1 0 -1 -1 0 1 -1 1 1
  [4,16,-1,1,-1,-1,0,-1,-1,0,1,-1,1,1],
// 4 16 1 1 -1 1 0 -1 -1 0 -1 -1 1 -1
  [4,16,1,1,-1,1,0,-1,-1,0,-1,-1,1,-1],
// 4 16 1 1 1 1 0 1 1 0 -1 1 1 -1
  [4,16,1,1,1,1,0,1,1,0,-1,1,1,-1],
];
module ldraw_lib__box4(step=0, col=false, unit=2/5, alt=false, line=0.2, solid=!$preview)
    makepoly(ldraw_lib__box4(), step=step, col=col, unit=unit, alt=alt, line=line, solid=solid);
ldraw_lib__box4(line=0.2);
// file: ../p/stud.scad
use <../lib.scad>
use <4-4cyli.scad>
use <4-4disc.scad>
use <4-4edge.scad>
function ldraw_lib__stud() = [
// 0 Stud
// 0 Name: stud.dat
// 0 Author: James Jessiman
// 0 !LDRAW_ORG Primitive UPDATE 2012-01
// 0 !LICENSE Licensed under CC BY 4.0 : see CAreadme.txt
// 
// 0 BFC CERTIFY CCW
  [0,"BFC","CERTIFY"],
  [0,"BFC","CCW"],
// 
// 0 !HISTORY 2002-04-04 [sbliss] Modified for BFC compliance
// 0 !HISTORY 2002-04-25 [PTadmin] Official Update 2002-02
// 0 !HISTORY 2007-06-24 [PTadmin] Header formatted for Contributor Agreement
// 0 !HISTORY 2008-07-01 [PTadmin] Official Update 2008-01
// 0 !HISTORY 2012-02-16 [Philo] Changed to CCW
// 0 !HISTORY 2012-03-30 [PTadmin] Official Update 2012-01
// 
// 
// 1 16 0 0 0 6 0 0 0 1 0 0 0 6 4-4edge.dat
  [1,16,0,0,0,6,0,0,0,1,0,0,0,6, ldraw_lib__4_4edge()],
// 1 16 0 -4 0 6 0 0 0 1 0 0 0 6 4-4edge.dat
  [1,16,0,-4,0,6,0,0,0,1,0,0,0,6, ldraw_lib__4_4edge()],
// 1 16 0 0 0 6 0 0 0 -4 0 0 0 6 4-4cyli.dat
  [1,16,0,0,0,6,0,0,0,-4,0,0,0,6, ldraw_lib__4_4cyli()],
// 1 16 0 -4 0 6 0 0 0 1 0 0 0 6 4-4disc.dat
  [1,16,0,-4,0,6,0,0,0,1,0,0,0,6, ldraw_lib__4_4disc()],
  [-1,16,0,0,0,6,0,0,0,-1,0,0,0,6, ldraw_lib__4_4disc()],
];
module ldraw_lib__stud(step=0, col=false, unit=2/5, alt=false, line=0.2, solid=!$preview)
    makepoly(ldraw_lib__stud(), step=step, col=col, unit=unit, alt=alt, line=line, solid=solid);
ldraw_lib__stud(line=0.2);
// file: s/3001s02.scad
use <../../lib.scad>
use <../../p/box4.scad>
use <../../p/box5.scad>
use <../../p/stud4.scad>
function ldraw_lib__s__3001s02() = [
// 0 ~Brick  2 x  4 without Top and Top Studs
// 0 Name: s\3001s02.dat
// 0 Author: Rene Rechthaler [Blechtaler]
// 0 !LDRAW_ORG Subpart UPDATE 2024-09
// 0 !LICENSE Licensed under CC BY 4.0 : see CAreadme.txt
// 
// 0 BFC CERTIFY CCW
  [0,"BFC","CERTIFY"],
  [0,"BFC","CCW"],
// 
// 0 !HISTORY 2023-11-20 [Blechtaler] made from 3001s01
// 0 !HISTORY 2024-10-27 [OrionP] Official Update 2024-09
// 
// 1 16 20 4 0 1 0 0 0 -5 0 0 0 1 stud4.dat
  [1,16,20,4,0,1,0,0,0,-5,0,0,0,1, ldraw_lib__stud4()],
// 1 16 0 4 0 1 0 0 0 -5 0 0 0 1 stud4.dat
  [1,16,0,4,0,1,0,0,0,-5,0,0,0,1, ldraw_lib__stud4()],
// 1 16 -20 4 0 1 0 0 0 -5 0 0 0 1 stud4.dat
  [1,16,-20,4,0,1,0,0,0,-5,0,0,0,1, ldraw_lib__stud4()],
// 0 BFC INVERTNEXT
  [0,"BFC","INVERTNEXT"],
// 1 16 0 24 0 36 0 0 0 -20 0 0 0 16 box5.dat
  [1,16,0,24,0,36,0,0,0,-20,0,0,0,16, ldraw_lib__box5()],
// 4 16 40 24 20 36 24 16 -36 24 16 -40 24 20
  [4,16,40,24,20,36,24,16,-36,24,16,-40,24,20],
// 4 16 -40 24 20 -36 24 16 -36 24 -16 -40 24 -20
  [4,16,-40,24,20,-36,24,16,-36,24,-16,-40,24,-20],
// 4 16 -40 24 -20 -36 24 -16 36 24 -16 40 24 -20
  [4,16,-40,24,-20,-36,24,-16,36,24,-16,40,24,-20],
// 4 16 40 24 -20 36 24 -16 36 24 16 40 24 20
  [4,16,40,24,-20,36,24,-16,36,24,16,40,24,20],
// 1 16 0 24 0 0 0 40 0 -24 0 -20 0 0 box4.dat
  [1,16,0,24,0,0,0,40,0,-24,0,-20,0,0, ldraw_lib__box4()],
];
module ldraw_lib__s__3001s02(step=0, col=false, unit=2/5, alt=false, line=0.2, solid=!$preview)
    makepoly(ldraw_lib__s__3001s02(), step=step, col=col, unit=unit, alt=alt, line=line, solid=solid);
ldraw_lib__s__3001s02(line=0.2);
// main file
use <../lib.scad>
use <s/3001s02.scad>
use <../p/stud.scad>
function ldraw_lib__60237() = [
// 0 Brick Braille 2 x 4 with 2 Studs (DOTS-34)
// 0 Name: 60237.dat
// 0 Author: Chris Böhnke [KnightOfTarenta]
// 0 !LDRAW_ORG Part UPDATE 2025-08
// 0 !LICENSE Licensed under CC BY 4.0 : see CAreadme.txt
// 
// 0 BFC CERTIFY CCW
  [0,"BFC","CERTIFY"],
  [0,"BFC","CCW"],
// 
// 0 !HISTORY 2025-08-25 [KnightOfTarenta] Modified from 60237p01.dat by Rene Rechthaler [Blechtaler]
// 0 !HISTORY 2025-08-31 [OrionP] Official Update 2025-08
// 
// 1 16 0 0 0 1 0 0 0 1 0 0 0 1 s\3001s02.dat
  [1,16,0,0,0,1,0,0,0,1,0,0,0,1, ldraw_lib__s__3001s02()],
// 1 16 -30 0 10 1 0 0 0 1 0 0 0 1 stud.dat
  [1,16,-30,0,10,1,0,0,0,1,0,0,0,1, ldraw_lib__stud()],
// 1 16 10 0 -10 1 0 0 0 1 0 0 0 1 stud.dat
  [1,16,10,0,-10,1,0,0,0,1,0,0,0,1, ldraw_lib__stud()],
// 
// 0 // Top
// 4 16 -40 0 -20 40 0 -20 40 0 20 -40 0 20
  [4,16,-40,0,-20,40,0,-20,40,0,20,-40,0,20],
];
module ldraw_lib__60237(step=0, col=false, unit=2/5, alt=false, line=0.2, solid=!$preview)
    makepoly(ldraw_lib__60237(), step=step, col=col, unit=unit, alt=alt, line=line, solid=solid);
ldraw_lib__60237(line=0.2);
